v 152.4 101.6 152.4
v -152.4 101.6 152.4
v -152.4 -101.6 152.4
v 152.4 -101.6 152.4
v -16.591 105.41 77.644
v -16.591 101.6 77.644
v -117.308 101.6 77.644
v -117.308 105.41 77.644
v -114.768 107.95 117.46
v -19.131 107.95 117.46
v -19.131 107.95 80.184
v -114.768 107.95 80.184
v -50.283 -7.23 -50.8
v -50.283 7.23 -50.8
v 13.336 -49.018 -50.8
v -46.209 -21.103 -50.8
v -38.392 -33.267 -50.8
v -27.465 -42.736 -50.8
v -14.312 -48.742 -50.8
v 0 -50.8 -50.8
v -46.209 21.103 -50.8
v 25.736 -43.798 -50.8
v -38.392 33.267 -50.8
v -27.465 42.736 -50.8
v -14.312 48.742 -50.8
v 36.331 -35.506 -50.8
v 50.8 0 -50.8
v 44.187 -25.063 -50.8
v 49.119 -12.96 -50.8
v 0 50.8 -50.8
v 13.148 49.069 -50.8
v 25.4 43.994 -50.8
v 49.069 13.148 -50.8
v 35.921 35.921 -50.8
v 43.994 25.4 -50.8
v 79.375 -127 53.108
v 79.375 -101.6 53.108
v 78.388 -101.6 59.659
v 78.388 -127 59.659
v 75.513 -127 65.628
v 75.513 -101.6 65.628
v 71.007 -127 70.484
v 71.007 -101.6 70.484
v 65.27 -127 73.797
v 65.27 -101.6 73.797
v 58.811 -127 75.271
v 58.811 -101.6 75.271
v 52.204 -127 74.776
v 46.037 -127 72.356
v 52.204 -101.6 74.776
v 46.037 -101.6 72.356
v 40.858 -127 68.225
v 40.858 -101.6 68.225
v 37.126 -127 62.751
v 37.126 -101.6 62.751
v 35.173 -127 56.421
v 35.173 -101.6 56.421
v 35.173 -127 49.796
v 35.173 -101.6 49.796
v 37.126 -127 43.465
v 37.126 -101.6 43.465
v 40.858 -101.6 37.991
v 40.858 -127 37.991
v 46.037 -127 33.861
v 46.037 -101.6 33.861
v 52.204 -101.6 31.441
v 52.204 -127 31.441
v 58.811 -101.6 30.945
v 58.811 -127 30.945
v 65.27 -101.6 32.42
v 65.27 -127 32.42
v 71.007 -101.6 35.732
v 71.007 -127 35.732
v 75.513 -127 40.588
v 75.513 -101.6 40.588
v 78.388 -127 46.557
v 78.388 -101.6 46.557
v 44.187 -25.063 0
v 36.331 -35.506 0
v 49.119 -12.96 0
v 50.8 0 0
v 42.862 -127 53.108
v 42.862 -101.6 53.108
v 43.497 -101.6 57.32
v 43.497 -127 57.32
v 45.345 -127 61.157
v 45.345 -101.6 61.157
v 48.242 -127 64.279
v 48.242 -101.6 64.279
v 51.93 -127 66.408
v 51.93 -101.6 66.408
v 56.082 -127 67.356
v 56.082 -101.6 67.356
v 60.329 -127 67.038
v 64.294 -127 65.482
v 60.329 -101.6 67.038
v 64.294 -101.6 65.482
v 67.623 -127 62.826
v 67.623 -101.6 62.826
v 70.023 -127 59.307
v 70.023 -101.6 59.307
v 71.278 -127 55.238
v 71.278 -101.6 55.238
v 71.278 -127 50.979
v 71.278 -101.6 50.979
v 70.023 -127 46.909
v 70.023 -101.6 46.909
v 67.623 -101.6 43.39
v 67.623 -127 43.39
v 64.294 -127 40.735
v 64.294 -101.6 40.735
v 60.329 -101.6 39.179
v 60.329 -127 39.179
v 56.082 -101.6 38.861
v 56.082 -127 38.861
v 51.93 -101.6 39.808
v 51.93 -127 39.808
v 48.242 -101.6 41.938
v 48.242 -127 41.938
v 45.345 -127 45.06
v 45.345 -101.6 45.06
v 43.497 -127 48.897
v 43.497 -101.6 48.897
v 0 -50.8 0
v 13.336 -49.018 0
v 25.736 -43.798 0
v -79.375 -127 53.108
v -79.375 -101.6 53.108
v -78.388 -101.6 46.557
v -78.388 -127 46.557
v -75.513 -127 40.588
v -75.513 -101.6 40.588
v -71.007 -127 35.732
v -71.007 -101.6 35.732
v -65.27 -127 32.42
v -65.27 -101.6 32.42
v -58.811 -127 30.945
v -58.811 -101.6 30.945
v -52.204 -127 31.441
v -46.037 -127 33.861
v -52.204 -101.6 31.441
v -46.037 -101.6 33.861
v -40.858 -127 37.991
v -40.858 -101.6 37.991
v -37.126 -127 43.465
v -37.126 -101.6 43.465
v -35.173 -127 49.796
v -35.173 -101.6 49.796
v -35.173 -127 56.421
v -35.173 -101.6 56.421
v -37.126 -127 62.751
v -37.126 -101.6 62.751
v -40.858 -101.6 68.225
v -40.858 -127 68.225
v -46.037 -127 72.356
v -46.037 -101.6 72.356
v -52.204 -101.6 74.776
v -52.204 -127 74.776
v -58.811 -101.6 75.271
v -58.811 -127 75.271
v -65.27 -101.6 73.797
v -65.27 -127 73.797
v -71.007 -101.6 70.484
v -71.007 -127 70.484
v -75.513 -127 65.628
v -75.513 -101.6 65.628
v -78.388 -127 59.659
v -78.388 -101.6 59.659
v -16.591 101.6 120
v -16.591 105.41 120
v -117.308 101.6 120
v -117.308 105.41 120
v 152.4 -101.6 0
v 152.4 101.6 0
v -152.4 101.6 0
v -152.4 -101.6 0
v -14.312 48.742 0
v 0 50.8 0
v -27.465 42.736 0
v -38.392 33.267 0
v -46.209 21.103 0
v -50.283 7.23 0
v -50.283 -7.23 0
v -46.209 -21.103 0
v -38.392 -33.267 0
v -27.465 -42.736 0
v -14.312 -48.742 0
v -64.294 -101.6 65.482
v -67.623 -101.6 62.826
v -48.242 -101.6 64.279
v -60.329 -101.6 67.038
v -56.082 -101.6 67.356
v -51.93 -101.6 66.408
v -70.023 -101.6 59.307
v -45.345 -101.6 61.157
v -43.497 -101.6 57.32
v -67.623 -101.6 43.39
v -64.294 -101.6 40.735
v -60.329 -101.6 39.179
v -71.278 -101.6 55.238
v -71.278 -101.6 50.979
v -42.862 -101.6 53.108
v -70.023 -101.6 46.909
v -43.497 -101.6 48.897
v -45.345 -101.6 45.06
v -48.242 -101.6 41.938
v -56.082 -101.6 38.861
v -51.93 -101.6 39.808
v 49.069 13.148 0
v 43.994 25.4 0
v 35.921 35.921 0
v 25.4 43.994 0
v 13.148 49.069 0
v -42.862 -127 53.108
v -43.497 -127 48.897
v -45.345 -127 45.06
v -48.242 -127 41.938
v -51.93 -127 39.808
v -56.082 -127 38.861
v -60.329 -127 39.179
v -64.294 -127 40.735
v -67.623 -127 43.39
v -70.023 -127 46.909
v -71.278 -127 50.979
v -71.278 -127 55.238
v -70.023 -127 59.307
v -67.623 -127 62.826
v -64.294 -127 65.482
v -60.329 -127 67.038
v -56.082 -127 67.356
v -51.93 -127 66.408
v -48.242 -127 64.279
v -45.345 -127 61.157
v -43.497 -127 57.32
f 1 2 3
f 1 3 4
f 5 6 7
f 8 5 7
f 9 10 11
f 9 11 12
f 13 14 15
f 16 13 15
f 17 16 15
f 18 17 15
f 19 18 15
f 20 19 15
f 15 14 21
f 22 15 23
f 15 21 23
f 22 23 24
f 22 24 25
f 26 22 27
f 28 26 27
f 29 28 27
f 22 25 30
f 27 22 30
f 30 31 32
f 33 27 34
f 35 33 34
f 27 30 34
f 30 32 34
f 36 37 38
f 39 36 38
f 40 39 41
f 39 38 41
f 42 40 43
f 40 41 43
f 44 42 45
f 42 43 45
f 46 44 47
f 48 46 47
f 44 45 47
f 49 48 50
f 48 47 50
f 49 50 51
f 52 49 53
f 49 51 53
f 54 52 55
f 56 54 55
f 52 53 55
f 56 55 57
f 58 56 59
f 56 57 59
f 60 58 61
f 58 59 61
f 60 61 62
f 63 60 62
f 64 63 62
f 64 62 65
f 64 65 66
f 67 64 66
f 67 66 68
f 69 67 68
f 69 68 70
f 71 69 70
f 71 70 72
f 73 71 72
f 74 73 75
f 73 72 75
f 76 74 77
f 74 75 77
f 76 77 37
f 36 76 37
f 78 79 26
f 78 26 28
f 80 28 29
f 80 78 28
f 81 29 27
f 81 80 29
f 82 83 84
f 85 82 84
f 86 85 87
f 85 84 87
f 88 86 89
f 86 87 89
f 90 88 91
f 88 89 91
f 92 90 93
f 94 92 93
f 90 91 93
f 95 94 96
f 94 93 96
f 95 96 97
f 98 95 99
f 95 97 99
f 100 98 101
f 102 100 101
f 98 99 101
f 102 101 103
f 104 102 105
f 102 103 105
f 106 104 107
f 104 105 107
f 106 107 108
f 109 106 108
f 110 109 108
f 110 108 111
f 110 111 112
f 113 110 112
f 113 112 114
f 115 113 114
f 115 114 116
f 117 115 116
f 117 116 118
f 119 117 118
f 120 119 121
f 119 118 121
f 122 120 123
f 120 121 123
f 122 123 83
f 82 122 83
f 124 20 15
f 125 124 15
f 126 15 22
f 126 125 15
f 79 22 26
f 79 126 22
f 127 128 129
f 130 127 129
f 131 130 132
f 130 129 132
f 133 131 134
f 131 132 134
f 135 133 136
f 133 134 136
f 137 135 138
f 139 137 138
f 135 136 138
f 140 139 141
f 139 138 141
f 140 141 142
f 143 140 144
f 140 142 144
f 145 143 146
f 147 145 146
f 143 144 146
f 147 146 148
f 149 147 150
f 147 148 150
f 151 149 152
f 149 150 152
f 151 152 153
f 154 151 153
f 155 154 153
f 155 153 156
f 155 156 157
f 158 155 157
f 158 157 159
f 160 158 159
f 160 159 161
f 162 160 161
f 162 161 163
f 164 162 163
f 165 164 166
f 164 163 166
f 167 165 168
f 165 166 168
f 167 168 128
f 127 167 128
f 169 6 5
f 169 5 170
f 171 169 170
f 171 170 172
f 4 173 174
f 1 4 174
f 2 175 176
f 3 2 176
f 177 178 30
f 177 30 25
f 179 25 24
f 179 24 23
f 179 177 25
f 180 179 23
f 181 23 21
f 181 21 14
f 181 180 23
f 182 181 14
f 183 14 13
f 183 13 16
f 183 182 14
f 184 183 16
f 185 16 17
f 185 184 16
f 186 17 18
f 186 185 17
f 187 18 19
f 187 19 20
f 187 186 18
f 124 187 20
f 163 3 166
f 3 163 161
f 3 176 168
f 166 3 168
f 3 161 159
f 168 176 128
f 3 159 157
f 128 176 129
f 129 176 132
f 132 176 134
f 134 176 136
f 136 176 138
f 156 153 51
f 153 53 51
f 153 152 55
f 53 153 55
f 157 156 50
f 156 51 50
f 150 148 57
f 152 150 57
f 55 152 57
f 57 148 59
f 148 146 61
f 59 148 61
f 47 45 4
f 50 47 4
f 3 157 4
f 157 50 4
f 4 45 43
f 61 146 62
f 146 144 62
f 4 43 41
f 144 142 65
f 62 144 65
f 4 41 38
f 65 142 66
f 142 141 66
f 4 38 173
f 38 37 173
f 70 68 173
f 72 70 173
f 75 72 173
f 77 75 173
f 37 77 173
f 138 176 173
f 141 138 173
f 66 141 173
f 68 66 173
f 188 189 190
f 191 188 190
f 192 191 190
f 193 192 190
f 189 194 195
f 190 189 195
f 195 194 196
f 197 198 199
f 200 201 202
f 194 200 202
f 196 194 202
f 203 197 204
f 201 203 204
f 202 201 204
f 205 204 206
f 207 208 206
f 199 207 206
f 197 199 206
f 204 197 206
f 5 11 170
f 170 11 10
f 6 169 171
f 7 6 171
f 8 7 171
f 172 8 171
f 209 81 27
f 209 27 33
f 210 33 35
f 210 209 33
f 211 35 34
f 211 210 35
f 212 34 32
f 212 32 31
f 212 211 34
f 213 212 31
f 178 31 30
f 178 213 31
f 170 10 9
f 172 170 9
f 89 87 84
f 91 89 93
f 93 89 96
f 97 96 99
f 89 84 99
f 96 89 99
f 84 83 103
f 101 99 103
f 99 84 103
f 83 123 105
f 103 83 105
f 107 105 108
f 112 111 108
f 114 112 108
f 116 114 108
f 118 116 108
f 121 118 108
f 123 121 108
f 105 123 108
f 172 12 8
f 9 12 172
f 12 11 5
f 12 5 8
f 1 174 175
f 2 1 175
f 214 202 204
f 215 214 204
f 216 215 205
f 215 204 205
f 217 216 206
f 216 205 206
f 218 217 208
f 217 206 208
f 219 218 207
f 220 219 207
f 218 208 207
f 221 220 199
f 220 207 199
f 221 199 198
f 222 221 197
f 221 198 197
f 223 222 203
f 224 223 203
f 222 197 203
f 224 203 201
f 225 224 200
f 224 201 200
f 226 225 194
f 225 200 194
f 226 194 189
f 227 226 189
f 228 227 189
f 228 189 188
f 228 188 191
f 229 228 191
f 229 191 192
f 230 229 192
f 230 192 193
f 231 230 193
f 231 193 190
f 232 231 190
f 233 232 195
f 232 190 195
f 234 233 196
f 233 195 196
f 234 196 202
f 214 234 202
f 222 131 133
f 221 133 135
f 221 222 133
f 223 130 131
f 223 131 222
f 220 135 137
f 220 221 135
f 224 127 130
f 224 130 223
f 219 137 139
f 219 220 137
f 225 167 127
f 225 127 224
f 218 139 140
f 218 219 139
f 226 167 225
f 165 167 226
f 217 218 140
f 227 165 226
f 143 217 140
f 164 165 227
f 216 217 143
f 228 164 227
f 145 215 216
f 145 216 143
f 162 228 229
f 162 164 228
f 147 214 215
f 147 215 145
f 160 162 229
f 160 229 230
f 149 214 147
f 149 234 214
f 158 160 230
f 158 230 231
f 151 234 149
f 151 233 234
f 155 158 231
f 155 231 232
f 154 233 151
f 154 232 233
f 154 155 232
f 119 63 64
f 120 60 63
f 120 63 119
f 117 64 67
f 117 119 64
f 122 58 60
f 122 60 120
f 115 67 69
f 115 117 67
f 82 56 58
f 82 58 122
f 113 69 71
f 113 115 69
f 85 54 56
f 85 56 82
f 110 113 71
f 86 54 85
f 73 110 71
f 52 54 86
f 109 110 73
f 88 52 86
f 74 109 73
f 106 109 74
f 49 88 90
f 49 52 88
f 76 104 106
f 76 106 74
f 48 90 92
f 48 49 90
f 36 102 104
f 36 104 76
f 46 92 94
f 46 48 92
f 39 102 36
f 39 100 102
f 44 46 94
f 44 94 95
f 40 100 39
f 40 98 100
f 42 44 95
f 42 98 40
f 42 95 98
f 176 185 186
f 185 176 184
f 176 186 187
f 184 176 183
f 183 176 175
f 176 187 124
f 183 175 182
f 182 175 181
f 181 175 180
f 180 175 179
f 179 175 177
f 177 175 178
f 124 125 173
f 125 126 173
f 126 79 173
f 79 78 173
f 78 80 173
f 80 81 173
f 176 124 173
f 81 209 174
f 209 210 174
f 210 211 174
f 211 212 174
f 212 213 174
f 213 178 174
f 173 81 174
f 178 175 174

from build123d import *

# Parameters (mm, degrees)
F1_DEPTH = 152.4
F2_DEPTH = 50.8
F4_DEPTH = 25.4
F5_W     = 100.7168591022
F5_H     = 42.3558056355
F6_DEPTH = 6.35
F7_SIZE  = 2.54


with BuildPart() as f1:
    # F0 (on Top) → F1 (new body)
    with BuildSketch(Plane.XY):
        with BuildLine():
            Line((152.4, 0), (50.8, 0))
            ThreePointArc((50.8, 0), (47.0438920676, -19.1706082098), (36.3310149947, -35.5063001375))
            ThreePointArc((36.3310149947, -35.5063001375), (19.7093880297, -46.820722159), (0, -50.8))
            Line((0, -50.8), (0, -101.6))
            Line((0, -101.6), (152.4, -101.6))
            Line((152.4, -101.6), (152.4, 0))
        make_face()
        with BuildLine():
            ThreePointArc((0, 50.8), (35.9210244843, 35.9210244843), (50.8, 0))
            Line((50.8, 0), (152.4, 0))
            Line((152.4, 0), (152.4, 101.6))
            Line((152.4, 101.6), (0, 101.6))
            Line((0, 101.6), (0, 50.8))
        make_face()
        with BuildLine():
            ThreePointArc((0, -50.8), (-50.8, 0), (0, 50.8))
            Line((0, 50.8), (0, 101.6))
            Line((0, 101.6), (-152.4, 101.6))
            Line((-152.4, 101.6), (-152.4, -101.6))
            Line((-152.4, -101.6), (0, -101.6))
            Line((0, -101.6), (0, -50.8))
        make_face()
        with BuildLine():
            Line((0, -50.8), (0, 0))
            Line((0, 0), (0, 50.8))
            ThreePointArc((0, 50.8), (-50.8, 0), (0, -50.8))
        make_face()
        with BuildLine():
            Line((0, 50.8), (0, 0))
            Line((0, 0), (50.8, 0))
            ThreePointArc((50.8, 0), (35.9210244843, 35.9210244843), (0, 50.8))
        make_face()
        with BuildLine():
            Line((36.3310149947, -35.5063001375), (0, 0))
            Line((0, 0), (0, -50.8))
            ThreePointArc((0, -50.8), (19.7093880297, -46.820722159), (36.3310149947, -35.5063001375))
        make_face()
        with BuildLine():
            Line((50.8, 0), (0, 0))
            Line((0, 0), (36.3310149947, -35.5063001375))
            ThreePointArc((36.3310149947, -35.5063001375), (47.0438920676, -19.1706082098), (50.8, 0))
        make_face()
    extrude(amount=F1_DEPTH)

    # F0 (on Top) → F2 (join)
    with BuildSketch(Plane.XY):
        with BuildLine():
            Line((36.3310149947, -35.5063001375), (0, 0))
            Line((0, 0), (0, -50.8))
            ThreePointArc((0, -50.8), (19.7093880297, -46.820722159), (36.3310149947, -35.5063001375))
        make_face()
        with BuildLine():
            Line((50.8, 0), (0, 0))
            Line((0, 0), (36.3310149947, -35.5063001375))
            ThreePointArc((36.3310149947, -35.5063001375), (47.0438920676, -19.1706082098), (50.8, 0))
        make_face()
        with BuildLine():
            Line((0, 50.8), (0, 0))
            Line((0, 0), (50.8, 0))
            ThreePointArc((50.8, 0), (35.9210244843, 35.9210244843), (0, 50.8))
        make_face()
        with BuildLine():
            Line((0, -50.8), (0, 0))
            Line((0, 0), (0, 50.8))
            ThreePointArc((0, 50.8), (-50.8, 0), (0, -50.8))
        make_face()
    extrude(amount=-F2_DEPTH)

    # F3 (on face) → F4 (join)
    with BuildSketch(Plane.XZ.offset(101.6)):
        with BuildLine():
            ThreePointArc((34.925, 53.1082823873), (57.15, 30.8832823873), (79.375, 53.1082823873))
            Line((79.375, 53.1082823873), (71.4375, 53.1082823873))
            ThreePointArc((71.4375, 53.1082823873), (57.15, 38.8207823873), (42.8625, 53.1082823873))
            Line((42.8625, 53.1082823873), (34.925, 53.1082823873))
        make_face()
        with BuildLine():
            Line((71.4375, 53.1082823873), (79.375, 53.1082823873))
            ThreePointArc((79.375, 53.1082823873), (57.15, 75.3332823873), (34.925, 53.1082823873))
            Line((34.925, 53.1082823873), (42.8625, 53.1082823873))
            ThreePointArc((42.8625, 53.1082823873), (57.15, 67.3957823873), (71.4375, 53.1082823873))
        make_face()
        with BuildLine():
            ThreePointArc((-34.925, 53.1082823873), (-57.15, 75.3332823873), (-79.375, 53.1082823873))
            Line((-79.375, 53.1082823873), (-71.4375, 53.1082823873))
            ThreePointArc((-71.4375, 53.1082823873), (-57.15, 67.3957823873), (-42.8625, 53.1082823873))
            Line((-42.8625, 53.1082823873), (-34.925, 53.1082823873))
        make_face()
        with BuildLine():
            Line((-71.4375, 53.1082823873), (-79.375, 53.1082823873))
            ThreePointArc((-79.375, 53.1082823873), (-57.15, 30.8832823873), (-34.925, 53.1082823873))
            Line((-34.925, 53.1082823873), (-42.8625, 53.1082823873))
            ThreePointArc((-42.8625, 53.1082823873), (-57.15, 38.8207823873), (-71.4375, 53.1082823873))
        make_face()
    extrude(amount=F4_DEPTH)


with BuildPart() as f6:
    # F5 (on face) → F6 (new body)
    with BuildSketch(Plane(origin=(0, 101.6, 0), x_dir=(-1, 0, 0), z_dir=(0, 1, 0))):
        with Locations((66.9497698545, 98.8216623664)):
            Rectangle(F5_W, F5_H)
    extrude(amount=F6_DEPTH)

    # F7
    f7_edges = [f6.edges().sort_by_distance(p)[0] for p in [
        (-66.94977, 107.95, 119.999565),
        (-117.308199, 107.95, 98.821662),
        (-16.59134, 107.95, 98.821662),
        (-66.94977, 107.95, 77.64376),
    ]]
    chamfer(f7_edges, length=F7_SIZE)


solid = Compound([f1.part, f6.part])
